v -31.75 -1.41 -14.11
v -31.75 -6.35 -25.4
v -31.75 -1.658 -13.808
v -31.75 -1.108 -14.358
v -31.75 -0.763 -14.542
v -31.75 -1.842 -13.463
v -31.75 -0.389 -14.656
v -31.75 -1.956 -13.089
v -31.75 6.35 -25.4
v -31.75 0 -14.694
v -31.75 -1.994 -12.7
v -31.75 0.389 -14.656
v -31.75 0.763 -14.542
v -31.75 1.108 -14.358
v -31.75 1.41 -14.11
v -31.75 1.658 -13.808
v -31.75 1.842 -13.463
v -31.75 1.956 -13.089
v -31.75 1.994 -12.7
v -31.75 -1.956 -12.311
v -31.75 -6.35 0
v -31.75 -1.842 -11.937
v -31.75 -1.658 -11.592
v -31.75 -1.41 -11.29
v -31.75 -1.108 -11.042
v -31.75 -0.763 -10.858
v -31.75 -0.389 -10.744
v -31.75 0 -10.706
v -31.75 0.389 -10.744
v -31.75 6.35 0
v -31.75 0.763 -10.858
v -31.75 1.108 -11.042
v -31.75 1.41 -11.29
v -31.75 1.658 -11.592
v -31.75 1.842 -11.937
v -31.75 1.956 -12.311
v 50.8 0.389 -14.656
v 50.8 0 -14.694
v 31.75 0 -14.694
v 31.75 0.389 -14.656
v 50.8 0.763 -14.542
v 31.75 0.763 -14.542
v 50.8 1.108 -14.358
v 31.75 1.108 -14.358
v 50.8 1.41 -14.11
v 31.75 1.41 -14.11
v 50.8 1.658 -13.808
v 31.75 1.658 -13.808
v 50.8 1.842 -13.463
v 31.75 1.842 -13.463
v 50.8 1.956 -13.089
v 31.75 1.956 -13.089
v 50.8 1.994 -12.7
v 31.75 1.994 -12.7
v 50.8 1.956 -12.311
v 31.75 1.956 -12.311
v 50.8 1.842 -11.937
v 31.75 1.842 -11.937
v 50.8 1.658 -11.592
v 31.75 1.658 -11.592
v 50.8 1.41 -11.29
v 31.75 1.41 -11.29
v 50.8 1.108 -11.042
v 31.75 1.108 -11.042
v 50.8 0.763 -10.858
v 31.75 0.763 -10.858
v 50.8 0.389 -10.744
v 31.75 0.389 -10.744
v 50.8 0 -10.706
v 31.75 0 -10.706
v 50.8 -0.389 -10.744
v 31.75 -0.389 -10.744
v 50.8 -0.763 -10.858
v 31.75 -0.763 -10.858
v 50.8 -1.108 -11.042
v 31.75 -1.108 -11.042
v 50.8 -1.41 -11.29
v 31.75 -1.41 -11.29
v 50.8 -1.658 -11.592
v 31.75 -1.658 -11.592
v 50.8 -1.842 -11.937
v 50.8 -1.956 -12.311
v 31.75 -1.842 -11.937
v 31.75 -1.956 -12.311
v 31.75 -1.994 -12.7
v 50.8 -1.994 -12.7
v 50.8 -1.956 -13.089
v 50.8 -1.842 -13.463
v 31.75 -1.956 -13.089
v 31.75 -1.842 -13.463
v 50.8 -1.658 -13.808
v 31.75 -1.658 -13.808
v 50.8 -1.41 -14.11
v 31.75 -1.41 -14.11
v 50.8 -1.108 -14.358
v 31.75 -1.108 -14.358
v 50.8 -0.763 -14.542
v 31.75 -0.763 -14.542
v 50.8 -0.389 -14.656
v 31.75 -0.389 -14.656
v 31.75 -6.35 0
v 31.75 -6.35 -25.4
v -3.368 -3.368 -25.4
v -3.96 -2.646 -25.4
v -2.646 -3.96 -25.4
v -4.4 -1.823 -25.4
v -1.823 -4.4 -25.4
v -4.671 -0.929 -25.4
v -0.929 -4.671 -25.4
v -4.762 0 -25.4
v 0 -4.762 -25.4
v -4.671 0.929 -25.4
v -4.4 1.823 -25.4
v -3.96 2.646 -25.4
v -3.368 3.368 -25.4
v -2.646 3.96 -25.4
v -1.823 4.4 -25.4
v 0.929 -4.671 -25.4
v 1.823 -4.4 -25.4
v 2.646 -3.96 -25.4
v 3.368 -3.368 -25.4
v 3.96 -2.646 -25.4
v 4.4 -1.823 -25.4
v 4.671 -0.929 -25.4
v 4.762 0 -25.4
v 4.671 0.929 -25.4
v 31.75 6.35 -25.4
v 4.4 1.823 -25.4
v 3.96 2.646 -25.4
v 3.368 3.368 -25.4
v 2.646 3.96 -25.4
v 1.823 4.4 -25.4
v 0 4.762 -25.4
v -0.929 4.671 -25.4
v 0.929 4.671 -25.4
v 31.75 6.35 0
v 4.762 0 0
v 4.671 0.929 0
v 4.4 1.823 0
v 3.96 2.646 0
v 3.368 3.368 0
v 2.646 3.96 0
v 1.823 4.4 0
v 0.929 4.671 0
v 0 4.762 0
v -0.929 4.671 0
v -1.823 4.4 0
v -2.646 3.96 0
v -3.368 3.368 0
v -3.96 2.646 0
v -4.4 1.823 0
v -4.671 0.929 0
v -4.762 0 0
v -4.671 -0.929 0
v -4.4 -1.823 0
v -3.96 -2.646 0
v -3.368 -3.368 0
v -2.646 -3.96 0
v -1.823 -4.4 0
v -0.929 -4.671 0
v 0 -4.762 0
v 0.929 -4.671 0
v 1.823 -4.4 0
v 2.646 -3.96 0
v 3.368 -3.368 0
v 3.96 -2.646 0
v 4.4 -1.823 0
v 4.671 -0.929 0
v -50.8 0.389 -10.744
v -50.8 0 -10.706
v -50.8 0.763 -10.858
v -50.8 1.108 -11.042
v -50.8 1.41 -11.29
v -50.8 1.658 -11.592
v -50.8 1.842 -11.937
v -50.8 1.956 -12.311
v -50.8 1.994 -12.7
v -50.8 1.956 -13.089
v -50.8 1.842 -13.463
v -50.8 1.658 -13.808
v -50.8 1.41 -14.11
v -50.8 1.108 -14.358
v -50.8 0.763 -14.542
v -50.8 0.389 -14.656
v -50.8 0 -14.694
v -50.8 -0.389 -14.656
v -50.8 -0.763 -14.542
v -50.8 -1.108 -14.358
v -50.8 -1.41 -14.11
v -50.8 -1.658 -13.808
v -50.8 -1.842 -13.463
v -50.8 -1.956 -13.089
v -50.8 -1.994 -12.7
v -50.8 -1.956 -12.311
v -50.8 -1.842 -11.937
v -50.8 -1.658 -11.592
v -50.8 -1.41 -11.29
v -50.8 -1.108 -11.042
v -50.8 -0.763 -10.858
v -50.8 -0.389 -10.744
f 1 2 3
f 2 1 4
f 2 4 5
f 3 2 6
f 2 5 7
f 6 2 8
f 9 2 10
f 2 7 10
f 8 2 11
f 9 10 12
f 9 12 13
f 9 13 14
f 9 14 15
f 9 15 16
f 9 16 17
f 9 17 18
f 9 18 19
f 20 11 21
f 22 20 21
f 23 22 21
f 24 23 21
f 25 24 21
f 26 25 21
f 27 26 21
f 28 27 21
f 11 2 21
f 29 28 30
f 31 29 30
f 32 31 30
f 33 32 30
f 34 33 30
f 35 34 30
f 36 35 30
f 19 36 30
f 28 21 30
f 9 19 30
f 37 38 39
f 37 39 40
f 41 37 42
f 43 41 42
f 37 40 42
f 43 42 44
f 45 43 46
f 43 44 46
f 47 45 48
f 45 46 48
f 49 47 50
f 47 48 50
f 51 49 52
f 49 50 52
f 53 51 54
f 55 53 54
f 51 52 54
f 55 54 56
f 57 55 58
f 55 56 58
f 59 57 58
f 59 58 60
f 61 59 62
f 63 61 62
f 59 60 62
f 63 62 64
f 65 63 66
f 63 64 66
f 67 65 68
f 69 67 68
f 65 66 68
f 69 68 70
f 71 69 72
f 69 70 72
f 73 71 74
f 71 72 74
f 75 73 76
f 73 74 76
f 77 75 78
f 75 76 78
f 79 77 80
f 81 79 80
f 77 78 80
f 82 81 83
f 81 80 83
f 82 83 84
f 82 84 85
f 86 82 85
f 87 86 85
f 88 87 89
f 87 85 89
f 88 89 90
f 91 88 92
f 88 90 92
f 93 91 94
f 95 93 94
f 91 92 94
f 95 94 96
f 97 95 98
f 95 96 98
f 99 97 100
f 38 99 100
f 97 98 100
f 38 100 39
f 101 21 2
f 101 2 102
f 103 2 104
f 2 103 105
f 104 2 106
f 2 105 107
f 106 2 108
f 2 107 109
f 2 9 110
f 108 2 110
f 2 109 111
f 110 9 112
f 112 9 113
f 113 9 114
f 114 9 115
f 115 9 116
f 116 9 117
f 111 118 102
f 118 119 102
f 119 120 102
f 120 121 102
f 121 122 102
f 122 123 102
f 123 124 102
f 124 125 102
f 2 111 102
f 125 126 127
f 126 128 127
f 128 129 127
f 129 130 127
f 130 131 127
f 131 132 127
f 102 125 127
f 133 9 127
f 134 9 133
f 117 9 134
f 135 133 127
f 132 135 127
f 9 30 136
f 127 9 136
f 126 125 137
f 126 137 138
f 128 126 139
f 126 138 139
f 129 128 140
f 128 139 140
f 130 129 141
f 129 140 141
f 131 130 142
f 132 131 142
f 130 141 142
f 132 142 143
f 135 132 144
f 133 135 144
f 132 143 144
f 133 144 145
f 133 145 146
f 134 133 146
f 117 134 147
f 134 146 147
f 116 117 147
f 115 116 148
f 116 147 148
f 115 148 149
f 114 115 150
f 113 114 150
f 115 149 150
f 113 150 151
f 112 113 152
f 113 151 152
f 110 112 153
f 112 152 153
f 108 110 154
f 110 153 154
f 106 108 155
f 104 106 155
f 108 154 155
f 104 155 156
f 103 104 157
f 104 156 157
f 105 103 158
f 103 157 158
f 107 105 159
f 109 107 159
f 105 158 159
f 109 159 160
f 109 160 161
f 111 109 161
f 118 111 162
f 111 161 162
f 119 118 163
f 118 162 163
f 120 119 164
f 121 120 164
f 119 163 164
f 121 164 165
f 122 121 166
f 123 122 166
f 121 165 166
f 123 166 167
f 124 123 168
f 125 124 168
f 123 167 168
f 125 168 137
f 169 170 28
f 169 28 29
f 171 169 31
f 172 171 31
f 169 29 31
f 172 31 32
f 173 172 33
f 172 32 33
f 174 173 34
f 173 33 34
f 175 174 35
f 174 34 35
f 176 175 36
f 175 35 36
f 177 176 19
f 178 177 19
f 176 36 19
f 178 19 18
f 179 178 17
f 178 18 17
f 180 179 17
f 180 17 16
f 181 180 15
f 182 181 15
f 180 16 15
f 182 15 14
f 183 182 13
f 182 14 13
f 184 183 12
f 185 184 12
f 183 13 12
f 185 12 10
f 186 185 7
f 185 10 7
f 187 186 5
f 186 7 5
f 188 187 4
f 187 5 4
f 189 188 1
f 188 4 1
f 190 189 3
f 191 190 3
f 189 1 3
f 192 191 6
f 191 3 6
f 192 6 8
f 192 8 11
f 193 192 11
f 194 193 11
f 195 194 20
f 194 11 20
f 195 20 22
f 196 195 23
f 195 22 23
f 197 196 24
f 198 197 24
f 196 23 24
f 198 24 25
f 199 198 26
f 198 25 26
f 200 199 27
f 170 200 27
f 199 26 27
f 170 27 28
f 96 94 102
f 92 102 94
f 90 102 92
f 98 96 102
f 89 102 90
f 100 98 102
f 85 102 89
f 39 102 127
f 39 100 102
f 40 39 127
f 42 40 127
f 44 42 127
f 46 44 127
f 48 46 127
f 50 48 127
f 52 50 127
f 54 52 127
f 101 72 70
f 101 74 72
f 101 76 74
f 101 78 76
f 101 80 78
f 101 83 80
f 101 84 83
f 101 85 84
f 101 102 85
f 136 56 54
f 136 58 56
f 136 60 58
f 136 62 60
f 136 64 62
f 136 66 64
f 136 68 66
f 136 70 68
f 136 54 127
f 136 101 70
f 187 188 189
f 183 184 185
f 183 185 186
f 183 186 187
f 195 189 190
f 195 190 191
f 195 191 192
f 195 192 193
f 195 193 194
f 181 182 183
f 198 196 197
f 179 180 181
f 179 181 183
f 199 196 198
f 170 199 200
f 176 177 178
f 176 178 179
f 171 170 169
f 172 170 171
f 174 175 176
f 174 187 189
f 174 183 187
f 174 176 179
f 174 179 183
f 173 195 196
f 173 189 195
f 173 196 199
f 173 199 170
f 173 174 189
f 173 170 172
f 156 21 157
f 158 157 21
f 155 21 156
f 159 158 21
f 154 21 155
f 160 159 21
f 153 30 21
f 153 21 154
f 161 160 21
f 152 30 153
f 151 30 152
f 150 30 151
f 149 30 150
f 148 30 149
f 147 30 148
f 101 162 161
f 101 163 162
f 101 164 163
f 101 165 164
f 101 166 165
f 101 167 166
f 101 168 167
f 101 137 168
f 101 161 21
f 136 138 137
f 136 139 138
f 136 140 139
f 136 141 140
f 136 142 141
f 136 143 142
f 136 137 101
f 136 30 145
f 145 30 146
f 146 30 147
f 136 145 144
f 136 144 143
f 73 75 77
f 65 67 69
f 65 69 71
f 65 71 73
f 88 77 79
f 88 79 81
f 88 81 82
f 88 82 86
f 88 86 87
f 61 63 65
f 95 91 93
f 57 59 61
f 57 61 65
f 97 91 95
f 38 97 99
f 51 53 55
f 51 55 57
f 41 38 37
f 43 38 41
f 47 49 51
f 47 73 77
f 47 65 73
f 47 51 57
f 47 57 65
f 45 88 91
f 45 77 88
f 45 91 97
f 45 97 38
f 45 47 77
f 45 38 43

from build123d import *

# Parameters (mm, degrees)
SKETCH1_W           = 63.5
SKETCH1_H           = 12.7
SKETCH1_R           = 4.7625
BOSS_EXTRUDE1_DEPTH = 25.4
SKETCH2_R           = 1.9939
BOSS_EXTRUDE2_DEPTH = 19.05
SKETCH3_R           = 1.9939
BOSS_EXTRUDE3_DEPTH = 19.05


with BuildPart() as part:
    # Sketch1 → Boss-Extrude1 (new body)
    with BuildSketch(Plane.XY):
        Rectangle(SKETCH1_W, SKETCH1_H)
        Circle(SKETCH1_R, mode=Mode.SUBTRACT)
    extrude(amount=-BOSS_EXTRUDE1_DEPTH)

    # Sketch2 → Boss-Extrude2 (add)
    with BuildSketch(Plane(origin=(31.75, 0, 0), x_dir=(0, 0, -1), z_dir=(1, 0, 0))):
        with Locations((12.7, 0)):
            Circle(SKETCH2_R)
    extrude(amount=BOSS_EXTRUDE2_DEPTH)

    # Sketch3 → Boss-Extrude3 (add)
    with BuildSketch(Plane.ZY.offset(31.75)):
        with Locations((-12.7, 0)):
            Circle(SKETCH3_R)
    extrude(amount=BOSS_EXTRUDE3_DEPTH)


solid = part.part
